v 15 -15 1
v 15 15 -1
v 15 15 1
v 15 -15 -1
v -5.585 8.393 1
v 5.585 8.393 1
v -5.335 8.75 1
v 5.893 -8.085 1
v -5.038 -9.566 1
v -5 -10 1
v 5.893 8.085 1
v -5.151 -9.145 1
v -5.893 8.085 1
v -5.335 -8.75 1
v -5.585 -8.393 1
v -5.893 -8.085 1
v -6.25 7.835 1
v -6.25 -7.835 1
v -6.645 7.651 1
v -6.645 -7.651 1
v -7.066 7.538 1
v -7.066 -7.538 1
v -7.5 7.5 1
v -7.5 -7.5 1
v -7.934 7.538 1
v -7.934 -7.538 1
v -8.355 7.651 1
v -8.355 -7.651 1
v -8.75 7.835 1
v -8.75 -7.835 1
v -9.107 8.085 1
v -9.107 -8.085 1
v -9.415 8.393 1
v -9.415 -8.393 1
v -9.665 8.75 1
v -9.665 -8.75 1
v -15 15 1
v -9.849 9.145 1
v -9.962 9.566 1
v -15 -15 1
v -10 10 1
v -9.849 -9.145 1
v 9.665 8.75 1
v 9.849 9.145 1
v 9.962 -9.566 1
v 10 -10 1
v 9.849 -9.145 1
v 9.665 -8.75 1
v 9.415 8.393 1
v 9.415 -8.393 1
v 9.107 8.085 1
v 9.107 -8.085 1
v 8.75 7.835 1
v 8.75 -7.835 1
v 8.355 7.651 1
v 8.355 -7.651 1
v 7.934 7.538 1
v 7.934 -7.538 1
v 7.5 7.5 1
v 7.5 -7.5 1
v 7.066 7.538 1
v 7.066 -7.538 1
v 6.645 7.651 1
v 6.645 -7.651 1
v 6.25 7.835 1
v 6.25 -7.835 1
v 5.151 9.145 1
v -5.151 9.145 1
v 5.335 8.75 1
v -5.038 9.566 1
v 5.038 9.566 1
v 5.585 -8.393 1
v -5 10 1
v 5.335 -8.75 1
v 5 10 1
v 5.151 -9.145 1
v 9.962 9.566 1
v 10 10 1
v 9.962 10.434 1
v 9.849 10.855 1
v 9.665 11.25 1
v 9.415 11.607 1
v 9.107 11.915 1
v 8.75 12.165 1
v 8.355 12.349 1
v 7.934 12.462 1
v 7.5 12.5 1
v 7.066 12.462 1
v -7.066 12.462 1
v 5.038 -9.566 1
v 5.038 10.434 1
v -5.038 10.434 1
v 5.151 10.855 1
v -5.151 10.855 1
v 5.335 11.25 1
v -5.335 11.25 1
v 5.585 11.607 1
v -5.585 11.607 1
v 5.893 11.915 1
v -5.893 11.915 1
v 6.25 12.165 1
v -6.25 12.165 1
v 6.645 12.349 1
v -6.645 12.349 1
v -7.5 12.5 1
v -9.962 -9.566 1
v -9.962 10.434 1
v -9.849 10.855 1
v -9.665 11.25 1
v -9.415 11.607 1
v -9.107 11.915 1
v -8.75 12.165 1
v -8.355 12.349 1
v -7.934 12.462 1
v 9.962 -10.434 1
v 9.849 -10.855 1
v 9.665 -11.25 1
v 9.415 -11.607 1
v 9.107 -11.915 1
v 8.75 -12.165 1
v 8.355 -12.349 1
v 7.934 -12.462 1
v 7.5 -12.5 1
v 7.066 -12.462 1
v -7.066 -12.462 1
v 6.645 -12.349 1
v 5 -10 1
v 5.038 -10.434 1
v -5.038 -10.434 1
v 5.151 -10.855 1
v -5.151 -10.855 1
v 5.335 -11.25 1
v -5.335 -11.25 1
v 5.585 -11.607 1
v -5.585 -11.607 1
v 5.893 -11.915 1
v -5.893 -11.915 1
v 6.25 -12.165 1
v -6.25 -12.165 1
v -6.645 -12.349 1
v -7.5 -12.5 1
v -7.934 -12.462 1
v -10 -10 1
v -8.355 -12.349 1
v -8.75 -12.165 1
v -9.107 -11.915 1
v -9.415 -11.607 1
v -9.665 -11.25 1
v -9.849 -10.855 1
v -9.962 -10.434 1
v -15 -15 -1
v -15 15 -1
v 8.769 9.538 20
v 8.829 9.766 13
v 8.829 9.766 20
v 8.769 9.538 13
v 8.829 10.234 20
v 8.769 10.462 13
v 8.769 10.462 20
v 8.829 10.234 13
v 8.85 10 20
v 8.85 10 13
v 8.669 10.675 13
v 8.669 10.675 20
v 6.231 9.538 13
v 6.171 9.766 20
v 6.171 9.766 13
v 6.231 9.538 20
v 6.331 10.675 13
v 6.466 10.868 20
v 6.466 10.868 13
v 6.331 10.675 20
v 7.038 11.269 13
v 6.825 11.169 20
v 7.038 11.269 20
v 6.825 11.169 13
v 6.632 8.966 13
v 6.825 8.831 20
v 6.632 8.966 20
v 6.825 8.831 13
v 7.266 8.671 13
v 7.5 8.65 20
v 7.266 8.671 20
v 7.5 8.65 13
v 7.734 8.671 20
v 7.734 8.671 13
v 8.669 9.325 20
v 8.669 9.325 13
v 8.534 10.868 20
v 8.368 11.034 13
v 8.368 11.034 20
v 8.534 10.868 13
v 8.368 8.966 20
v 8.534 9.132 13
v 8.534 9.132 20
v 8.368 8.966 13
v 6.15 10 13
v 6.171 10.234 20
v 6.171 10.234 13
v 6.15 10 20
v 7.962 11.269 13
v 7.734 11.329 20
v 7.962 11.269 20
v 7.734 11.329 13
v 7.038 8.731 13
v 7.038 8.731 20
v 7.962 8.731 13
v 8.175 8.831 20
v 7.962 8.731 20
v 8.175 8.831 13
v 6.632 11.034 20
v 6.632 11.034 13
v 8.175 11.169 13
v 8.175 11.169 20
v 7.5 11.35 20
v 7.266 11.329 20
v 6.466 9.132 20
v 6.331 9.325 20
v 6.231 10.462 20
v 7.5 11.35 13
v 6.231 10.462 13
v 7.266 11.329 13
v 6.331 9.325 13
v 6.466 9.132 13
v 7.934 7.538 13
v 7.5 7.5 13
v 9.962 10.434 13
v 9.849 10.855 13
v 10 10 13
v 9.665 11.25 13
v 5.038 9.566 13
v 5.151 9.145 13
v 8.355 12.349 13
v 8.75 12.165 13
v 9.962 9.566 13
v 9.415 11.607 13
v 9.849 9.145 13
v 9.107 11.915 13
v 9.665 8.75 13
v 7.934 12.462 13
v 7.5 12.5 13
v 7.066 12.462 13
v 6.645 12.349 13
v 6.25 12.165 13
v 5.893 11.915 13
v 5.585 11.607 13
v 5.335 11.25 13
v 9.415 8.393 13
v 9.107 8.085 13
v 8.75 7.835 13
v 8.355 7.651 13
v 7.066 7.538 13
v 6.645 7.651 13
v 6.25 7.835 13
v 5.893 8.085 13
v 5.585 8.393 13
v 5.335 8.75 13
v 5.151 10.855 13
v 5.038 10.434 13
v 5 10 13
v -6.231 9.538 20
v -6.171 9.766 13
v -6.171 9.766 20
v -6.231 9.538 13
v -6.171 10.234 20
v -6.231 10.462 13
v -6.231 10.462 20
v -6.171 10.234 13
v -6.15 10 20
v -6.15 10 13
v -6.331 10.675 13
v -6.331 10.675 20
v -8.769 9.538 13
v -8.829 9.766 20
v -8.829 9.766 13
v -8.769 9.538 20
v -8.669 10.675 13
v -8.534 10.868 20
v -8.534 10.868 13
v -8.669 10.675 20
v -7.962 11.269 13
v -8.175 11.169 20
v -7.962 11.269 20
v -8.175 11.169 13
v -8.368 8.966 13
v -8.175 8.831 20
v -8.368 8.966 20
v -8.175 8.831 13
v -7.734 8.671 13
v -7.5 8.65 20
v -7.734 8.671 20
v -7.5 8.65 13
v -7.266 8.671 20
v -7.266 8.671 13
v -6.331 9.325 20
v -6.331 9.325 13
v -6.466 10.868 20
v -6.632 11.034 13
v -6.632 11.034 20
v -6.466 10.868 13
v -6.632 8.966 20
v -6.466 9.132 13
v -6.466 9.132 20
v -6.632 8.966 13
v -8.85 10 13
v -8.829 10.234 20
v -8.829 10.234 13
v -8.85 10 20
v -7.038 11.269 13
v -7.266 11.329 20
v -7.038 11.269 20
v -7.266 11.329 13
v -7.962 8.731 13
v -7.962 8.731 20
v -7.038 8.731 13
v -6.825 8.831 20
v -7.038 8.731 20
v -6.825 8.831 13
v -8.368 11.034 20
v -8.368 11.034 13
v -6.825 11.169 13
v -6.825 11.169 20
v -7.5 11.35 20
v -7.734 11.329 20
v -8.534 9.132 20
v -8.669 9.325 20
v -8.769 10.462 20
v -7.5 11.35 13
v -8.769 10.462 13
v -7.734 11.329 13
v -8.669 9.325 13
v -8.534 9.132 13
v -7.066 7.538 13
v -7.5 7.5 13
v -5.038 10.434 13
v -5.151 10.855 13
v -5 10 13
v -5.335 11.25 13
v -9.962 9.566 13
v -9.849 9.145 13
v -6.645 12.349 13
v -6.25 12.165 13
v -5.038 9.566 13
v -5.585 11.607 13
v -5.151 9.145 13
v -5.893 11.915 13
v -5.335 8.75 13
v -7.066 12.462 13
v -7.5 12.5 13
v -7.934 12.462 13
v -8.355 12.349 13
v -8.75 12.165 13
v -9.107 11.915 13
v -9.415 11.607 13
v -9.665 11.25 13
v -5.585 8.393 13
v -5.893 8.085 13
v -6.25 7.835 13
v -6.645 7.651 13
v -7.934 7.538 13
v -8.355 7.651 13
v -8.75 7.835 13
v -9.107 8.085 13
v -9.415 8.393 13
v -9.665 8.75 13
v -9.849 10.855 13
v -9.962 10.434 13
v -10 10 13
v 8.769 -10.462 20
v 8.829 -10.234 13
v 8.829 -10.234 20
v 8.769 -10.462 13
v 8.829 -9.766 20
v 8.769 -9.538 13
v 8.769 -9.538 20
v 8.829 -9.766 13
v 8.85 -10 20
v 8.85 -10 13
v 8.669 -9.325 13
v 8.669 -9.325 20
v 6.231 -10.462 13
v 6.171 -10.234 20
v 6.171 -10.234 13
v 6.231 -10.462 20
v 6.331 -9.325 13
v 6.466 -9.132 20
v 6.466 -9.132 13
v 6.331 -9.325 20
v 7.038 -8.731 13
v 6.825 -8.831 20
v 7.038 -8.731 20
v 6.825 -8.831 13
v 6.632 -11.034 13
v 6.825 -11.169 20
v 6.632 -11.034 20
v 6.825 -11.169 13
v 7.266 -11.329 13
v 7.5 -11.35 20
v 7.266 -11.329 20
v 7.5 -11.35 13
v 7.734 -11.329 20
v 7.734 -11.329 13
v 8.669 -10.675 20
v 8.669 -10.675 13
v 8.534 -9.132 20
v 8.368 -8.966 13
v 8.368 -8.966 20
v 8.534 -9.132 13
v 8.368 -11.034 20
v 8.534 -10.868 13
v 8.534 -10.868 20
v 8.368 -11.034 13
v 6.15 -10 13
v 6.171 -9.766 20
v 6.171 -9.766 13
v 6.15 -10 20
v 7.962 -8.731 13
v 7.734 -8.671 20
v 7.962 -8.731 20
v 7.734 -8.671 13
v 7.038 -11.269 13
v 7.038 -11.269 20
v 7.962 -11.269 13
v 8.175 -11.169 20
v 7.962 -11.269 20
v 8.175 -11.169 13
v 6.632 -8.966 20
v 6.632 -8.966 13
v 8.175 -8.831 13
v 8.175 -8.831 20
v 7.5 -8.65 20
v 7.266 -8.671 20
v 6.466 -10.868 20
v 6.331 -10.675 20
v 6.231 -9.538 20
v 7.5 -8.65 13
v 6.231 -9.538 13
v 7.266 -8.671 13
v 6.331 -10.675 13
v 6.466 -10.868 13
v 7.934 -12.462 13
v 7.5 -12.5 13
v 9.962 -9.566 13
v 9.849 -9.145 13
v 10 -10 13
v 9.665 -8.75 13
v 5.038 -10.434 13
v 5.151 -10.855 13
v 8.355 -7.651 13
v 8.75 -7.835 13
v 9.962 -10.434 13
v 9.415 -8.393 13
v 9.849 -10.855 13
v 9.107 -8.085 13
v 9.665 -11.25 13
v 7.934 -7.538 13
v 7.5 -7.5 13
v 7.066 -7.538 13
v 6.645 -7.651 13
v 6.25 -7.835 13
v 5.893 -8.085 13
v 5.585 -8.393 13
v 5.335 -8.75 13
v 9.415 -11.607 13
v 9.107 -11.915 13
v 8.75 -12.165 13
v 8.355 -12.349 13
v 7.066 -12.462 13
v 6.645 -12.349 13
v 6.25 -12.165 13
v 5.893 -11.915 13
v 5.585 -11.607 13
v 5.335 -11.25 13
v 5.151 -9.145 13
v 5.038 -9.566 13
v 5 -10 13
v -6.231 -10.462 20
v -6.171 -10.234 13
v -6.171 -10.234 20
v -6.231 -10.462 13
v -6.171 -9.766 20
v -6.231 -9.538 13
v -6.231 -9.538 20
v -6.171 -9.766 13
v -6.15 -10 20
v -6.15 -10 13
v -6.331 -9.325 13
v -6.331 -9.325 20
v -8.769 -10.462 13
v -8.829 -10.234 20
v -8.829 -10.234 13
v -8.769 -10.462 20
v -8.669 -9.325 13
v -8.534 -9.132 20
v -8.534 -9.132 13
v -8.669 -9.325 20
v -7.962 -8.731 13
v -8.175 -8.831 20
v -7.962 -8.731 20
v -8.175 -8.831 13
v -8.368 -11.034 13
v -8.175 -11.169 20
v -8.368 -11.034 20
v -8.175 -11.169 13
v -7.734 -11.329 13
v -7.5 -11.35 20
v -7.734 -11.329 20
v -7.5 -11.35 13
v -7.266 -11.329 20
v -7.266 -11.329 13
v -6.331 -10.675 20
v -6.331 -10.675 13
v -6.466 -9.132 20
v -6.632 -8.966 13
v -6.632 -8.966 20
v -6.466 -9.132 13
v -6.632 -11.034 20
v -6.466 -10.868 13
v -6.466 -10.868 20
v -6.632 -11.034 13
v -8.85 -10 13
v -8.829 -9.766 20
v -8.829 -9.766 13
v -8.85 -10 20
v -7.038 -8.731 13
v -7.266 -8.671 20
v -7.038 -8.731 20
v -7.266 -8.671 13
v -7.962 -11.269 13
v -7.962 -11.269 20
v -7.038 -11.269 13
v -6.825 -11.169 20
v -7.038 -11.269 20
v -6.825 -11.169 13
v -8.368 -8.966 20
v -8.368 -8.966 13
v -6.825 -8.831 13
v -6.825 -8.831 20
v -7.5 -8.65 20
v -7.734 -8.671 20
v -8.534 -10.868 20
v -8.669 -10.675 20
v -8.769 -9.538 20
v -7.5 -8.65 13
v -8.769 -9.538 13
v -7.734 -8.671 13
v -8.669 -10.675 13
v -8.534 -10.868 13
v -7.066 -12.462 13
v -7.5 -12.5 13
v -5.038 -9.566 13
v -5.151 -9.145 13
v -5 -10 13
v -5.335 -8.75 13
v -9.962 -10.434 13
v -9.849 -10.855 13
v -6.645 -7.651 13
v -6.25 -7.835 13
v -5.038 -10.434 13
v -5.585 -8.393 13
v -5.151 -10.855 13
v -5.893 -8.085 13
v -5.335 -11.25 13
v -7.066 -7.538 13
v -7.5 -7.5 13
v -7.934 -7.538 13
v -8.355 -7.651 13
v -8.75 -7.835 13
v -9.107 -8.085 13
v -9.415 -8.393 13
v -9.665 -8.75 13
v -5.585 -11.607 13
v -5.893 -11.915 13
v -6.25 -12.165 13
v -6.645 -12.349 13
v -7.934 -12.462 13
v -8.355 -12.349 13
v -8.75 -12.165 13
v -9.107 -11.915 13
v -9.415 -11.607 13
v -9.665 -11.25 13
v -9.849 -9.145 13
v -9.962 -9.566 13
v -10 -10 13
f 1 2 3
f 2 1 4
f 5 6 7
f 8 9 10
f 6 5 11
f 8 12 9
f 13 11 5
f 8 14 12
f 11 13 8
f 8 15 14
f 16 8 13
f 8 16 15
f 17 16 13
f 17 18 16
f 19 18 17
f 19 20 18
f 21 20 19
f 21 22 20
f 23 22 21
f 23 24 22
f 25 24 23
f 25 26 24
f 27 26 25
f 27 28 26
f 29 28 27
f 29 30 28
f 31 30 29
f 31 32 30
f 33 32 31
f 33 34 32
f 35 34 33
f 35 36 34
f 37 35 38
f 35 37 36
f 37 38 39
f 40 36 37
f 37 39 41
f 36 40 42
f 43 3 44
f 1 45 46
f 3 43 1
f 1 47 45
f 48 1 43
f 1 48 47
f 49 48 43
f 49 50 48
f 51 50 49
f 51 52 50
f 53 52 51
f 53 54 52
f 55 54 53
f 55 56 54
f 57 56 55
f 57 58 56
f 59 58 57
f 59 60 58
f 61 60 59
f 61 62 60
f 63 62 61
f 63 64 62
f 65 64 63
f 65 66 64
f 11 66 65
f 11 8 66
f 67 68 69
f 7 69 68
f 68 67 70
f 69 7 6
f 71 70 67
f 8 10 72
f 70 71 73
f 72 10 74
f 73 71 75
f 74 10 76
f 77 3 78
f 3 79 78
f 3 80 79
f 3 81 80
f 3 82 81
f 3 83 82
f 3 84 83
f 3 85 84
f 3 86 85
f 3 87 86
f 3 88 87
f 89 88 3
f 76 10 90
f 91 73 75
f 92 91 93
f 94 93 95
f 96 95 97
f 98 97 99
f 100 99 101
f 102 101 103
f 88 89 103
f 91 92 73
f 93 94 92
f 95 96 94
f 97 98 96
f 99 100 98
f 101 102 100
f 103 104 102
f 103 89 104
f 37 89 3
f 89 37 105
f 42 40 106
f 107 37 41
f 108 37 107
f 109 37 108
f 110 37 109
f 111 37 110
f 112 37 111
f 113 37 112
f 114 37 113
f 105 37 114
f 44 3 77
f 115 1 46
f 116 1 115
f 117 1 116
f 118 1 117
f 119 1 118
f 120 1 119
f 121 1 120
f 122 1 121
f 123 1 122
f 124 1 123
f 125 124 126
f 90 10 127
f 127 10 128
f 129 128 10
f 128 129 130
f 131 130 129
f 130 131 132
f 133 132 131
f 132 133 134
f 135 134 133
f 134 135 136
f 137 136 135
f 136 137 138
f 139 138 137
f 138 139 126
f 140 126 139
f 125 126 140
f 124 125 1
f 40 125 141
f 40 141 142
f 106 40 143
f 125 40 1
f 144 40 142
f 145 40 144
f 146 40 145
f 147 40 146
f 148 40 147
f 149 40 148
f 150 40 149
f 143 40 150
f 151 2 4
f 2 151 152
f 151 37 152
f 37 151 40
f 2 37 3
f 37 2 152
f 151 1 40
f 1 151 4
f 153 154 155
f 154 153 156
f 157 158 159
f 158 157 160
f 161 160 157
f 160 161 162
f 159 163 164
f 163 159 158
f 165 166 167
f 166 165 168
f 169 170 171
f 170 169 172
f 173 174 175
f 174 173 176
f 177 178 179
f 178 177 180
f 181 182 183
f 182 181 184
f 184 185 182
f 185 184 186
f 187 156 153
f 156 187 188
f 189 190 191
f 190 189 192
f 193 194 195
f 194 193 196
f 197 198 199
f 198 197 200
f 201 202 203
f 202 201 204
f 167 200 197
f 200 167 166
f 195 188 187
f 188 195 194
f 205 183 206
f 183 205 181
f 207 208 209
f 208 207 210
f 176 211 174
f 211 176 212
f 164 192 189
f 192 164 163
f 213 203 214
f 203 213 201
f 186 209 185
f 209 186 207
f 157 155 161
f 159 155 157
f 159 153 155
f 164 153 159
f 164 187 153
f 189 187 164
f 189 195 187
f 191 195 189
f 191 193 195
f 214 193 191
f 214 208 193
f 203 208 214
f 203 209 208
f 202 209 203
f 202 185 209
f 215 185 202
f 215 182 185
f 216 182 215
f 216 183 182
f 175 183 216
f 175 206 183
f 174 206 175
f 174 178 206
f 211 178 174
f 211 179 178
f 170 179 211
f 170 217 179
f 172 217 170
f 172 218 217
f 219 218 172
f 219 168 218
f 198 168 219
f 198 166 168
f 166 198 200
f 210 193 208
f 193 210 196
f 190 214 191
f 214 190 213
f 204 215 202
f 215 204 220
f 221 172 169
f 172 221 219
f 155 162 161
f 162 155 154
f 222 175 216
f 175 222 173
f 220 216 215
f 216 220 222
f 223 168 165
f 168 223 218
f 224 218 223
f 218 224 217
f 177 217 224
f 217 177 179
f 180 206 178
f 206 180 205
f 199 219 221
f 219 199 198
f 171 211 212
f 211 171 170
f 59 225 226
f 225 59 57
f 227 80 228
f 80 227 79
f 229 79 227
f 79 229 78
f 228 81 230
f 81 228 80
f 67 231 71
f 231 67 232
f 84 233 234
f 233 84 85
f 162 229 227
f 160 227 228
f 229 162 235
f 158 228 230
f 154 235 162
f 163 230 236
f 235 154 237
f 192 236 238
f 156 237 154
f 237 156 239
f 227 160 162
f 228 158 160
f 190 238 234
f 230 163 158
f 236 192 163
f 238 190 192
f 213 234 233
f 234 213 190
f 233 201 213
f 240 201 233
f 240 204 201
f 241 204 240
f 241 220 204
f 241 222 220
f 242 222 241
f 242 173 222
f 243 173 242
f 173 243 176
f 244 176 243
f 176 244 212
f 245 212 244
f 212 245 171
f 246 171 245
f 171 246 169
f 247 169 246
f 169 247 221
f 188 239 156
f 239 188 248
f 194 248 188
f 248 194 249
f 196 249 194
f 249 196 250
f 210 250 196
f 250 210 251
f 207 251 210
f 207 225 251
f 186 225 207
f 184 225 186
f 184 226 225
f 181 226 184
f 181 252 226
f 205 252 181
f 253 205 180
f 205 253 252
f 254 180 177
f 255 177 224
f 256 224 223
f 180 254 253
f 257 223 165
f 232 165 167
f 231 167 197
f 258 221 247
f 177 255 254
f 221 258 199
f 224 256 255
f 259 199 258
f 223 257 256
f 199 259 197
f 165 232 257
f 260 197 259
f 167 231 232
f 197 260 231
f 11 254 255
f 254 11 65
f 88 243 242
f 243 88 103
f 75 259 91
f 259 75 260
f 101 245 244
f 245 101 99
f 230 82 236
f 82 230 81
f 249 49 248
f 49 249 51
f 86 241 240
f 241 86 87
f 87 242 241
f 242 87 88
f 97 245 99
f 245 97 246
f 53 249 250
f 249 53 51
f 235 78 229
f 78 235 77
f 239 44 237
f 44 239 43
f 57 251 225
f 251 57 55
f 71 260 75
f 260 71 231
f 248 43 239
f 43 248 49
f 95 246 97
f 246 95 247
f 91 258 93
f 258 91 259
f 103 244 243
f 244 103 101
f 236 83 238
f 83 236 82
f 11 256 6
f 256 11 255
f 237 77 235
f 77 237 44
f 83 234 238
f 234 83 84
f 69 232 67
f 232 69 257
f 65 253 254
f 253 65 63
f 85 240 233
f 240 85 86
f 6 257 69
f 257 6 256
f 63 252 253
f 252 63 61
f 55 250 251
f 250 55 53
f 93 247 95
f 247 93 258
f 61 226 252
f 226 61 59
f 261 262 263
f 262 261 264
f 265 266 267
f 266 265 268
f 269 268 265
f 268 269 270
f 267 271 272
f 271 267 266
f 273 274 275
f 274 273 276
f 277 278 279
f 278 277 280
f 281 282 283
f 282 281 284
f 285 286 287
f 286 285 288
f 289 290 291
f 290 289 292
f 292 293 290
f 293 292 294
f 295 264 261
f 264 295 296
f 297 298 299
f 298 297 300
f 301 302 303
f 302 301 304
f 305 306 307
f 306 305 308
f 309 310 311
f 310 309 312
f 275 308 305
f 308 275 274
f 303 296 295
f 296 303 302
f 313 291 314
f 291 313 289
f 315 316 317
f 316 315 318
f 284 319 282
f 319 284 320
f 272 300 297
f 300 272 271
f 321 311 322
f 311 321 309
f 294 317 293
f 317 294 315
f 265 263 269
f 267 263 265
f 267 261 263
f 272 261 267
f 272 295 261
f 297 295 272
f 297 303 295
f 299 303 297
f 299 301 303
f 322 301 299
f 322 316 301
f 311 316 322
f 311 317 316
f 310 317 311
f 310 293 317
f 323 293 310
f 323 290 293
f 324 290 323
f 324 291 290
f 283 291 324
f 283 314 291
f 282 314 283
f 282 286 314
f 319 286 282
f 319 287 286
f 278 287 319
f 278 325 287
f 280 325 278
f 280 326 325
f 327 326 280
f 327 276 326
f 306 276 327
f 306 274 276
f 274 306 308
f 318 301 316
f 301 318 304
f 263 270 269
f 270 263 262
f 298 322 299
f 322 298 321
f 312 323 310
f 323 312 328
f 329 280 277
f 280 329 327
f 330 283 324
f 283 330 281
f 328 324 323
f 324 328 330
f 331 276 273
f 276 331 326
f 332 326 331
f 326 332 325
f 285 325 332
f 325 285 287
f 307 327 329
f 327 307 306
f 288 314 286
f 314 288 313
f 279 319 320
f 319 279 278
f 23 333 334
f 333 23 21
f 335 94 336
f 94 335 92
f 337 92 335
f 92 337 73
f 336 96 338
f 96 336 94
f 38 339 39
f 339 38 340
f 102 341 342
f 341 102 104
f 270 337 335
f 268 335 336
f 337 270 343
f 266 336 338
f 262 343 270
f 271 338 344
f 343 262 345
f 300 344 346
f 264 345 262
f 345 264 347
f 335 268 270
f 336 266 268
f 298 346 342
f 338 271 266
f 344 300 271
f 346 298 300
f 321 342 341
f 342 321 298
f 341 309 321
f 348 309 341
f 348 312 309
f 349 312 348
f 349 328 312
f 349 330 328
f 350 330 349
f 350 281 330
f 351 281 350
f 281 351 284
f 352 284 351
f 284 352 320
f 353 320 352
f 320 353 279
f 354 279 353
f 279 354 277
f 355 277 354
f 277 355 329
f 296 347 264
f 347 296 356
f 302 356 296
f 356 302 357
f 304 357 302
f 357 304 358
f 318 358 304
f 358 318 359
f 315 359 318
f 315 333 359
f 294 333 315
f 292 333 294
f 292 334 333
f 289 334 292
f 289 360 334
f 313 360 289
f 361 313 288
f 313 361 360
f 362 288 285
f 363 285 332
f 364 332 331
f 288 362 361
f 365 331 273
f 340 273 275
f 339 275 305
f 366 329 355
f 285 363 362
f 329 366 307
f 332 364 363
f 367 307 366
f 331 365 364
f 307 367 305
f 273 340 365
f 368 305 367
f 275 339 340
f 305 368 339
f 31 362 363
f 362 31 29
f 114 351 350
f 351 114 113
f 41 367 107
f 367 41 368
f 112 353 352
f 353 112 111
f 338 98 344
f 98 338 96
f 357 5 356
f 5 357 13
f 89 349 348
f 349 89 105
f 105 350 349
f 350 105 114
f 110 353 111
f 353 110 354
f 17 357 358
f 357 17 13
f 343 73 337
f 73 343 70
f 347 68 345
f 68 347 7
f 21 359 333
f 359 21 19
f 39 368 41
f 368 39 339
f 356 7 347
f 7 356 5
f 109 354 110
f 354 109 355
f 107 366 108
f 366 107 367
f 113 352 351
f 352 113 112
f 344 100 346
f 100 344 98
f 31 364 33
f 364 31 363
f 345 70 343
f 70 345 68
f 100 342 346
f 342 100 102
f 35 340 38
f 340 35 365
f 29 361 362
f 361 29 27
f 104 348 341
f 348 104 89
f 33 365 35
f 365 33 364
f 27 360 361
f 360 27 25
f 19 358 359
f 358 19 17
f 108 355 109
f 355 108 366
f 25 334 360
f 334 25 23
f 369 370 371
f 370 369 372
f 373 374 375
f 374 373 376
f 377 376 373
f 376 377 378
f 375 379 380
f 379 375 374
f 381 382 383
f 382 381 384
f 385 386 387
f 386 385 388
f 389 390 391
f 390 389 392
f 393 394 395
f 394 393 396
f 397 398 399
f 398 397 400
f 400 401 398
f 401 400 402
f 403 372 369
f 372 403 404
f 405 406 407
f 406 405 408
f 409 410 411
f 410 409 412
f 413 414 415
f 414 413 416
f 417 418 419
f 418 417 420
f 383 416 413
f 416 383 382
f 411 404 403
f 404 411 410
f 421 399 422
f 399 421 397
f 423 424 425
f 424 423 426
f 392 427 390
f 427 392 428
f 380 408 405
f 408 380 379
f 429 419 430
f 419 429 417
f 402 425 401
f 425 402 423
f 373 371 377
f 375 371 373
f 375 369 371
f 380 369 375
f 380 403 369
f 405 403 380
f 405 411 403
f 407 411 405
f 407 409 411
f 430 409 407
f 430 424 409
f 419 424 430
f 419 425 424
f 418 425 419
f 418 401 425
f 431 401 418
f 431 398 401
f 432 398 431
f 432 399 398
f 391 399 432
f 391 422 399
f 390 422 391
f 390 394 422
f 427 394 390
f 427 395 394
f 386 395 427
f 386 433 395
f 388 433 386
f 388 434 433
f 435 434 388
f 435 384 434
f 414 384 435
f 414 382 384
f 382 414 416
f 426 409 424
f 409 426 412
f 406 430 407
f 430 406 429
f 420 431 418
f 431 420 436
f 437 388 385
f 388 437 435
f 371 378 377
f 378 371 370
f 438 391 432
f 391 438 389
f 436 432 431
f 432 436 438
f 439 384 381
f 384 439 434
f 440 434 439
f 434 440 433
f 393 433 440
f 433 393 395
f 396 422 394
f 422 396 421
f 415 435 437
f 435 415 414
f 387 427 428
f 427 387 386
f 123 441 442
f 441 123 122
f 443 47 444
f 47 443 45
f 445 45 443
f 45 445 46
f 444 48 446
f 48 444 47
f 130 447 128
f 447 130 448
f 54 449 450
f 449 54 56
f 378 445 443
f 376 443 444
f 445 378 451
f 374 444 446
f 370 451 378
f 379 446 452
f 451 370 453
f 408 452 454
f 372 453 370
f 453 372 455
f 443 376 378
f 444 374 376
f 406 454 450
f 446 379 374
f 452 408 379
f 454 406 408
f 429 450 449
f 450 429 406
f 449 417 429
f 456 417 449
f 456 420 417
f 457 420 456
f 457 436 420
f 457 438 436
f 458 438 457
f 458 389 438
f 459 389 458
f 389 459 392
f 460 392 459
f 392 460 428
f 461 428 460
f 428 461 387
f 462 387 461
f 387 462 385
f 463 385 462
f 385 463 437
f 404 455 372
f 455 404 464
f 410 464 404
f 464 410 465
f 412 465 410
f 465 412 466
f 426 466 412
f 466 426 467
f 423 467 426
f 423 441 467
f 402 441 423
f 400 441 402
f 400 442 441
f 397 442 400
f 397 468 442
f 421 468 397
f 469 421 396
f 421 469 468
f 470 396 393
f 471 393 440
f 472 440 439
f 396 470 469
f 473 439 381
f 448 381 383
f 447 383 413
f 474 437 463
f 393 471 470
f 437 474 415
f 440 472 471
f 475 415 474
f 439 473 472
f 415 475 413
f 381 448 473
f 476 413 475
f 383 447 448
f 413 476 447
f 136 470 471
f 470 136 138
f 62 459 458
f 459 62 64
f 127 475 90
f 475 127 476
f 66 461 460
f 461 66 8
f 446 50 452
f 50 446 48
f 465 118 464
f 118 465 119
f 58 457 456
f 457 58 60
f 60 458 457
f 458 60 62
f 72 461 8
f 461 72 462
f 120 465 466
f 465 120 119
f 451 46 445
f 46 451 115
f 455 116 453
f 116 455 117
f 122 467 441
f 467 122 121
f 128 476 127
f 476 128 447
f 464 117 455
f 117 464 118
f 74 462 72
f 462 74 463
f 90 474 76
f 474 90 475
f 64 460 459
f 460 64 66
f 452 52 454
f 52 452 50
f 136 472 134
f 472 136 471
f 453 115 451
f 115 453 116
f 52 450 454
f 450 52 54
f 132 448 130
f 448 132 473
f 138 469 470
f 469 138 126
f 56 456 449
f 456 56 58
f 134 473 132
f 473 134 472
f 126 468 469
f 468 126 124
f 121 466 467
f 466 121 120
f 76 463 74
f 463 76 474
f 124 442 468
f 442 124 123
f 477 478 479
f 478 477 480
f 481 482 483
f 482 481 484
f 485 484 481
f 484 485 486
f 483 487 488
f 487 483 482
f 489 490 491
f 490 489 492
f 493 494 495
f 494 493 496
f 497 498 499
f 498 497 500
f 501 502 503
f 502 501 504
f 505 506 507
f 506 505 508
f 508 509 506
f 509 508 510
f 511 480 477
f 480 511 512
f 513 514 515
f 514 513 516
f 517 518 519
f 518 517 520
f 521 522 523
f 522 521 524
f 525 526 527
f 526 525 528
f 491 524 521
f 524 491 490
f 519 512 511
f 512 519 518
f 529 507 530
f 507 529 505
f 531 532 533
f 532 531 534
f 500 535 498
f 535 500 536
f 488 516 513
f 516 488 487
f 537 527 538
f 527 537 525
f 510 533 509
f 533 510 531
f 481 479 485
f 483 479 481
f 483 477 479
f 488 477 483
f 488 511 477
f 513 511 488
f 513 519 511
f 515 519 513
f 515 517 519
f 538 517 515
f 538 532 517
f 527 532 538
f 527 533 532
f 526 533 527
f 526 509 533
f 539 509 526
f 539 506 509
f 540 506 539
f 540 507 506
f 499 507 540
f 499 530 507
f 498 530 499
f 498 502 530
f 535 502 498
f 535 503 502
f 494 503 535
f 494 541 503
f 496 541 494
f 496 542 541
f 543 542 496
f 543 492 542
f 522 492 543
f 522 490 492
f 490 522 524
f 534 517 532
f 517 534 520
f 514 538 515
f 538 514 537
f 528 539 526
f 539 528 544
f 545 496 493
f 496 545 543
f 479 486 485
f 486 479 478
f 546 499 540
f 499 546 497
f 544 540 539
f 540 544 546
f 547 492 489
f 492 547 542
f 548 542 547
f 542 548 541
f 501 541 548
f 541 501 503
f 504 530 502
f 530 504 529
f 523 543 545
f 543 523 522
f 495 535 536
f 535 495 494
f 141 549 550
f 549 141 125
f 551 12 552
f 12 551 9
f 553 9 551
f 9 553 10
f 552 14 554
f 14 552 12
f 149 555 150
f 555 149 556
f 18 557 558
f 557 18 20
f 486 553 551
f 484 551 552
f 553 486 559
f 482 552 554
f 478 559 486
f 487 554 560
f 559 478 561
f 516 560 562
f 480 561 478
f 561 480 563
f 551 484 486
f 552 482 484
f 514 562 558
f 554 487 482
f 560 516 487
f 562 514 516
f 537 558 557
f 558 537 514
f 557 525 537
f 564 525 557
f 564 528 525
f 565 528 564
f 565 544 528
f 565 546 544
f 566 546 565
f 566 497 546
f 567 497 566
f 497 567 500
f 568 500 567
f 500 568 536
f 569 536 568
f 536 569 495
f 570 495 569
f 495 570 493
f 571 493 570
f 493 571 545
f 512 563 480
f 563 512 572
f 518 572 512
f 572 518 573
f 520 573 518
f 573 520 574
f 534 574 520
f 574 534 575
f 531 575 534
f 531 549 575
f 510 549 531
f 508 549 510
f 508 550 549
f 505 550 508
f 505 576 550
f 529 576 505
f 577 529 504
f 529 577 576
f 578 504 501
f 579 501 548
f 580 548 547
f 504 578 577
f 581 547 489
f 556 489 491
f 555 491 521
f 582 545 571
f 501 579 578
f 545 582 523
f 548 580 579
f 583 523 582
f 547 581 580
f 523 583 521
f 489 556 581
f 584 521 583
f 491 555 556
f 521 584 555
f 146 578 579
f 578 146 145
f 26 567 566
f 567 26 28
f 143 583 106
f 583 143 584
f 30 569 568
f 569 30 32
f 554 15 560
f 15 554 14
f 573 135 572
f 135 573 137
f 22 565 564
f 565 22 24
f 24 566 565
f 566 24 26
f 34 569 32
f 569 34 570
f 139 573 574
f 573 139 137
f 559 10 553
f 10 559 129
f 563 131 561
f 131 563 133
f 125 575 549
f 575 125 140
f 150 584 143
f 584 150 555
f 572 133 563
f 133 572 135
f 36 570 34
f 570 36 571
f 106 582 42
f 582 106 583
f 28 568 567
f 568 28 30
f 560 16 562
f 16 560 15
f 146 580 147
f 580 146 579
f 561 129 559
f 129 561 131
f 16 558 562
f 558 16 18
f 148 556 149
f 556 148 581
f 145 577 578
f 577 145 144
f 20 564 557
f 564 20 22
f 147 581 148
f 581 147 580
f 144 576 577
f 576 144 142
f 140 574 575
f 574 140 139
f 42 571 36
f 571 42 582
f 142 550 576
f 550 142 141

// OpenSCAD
//---------------------------------------------------------------------------------------------
//-- Print of OpenBeam
//-- (c) Martin Korinek	m.ko@inode.at
//-- April-2015
//---------------------------------------------------------------------------------------------
//--
//---------------------------------------------------------------------------------------------

use <MCAD/fonts.scad>

//fragment minimum angle
  $fa=10.0;

//fragment minimum size
  $fs=0.2;
  
  SmallPinHight = 20.0;
  BigPinHeight = 13.0;
  SmallPinsDiameter = 2.7;
  BigPinsDiameter = 5.0;   

difference()
{
	//cube([70,90,1],center = true);
	cube([30,30,2],center = true);
	translate([0,0,-2])
	{
		translate([28,38,0])
			cylinder(d = 7, h = 5);
		translate([-28,38,0])
			cylinder(d = 7, h = 5);
		translate([28,-38,0])
			cylinder(d = 7, h = 5);
		translate([-28,-38,0])
			cylinder(d = 7, h = 5);
	}
	
}

translate([7.5,10,0])
{       
	cylinder(d = SmallPinsDiameter, h = SmallPinHight);
    cylinder(d = BigPinsDiameter, h = BigPinHeight);
};
translate([-7.5,10,0])
{
   	cylinder(d = SmallPinsDiameter, h = SmallPinHight);
    cylinder(d = BigPinsDiameter, h = BigPinHeight); 
}

translate([7.5,-10,0])
{
   	cylinder(d = SmallPinsDiameter, h = SmallPinHight);
    cylinder(d = BigPinsDiameter, h = BigPinHeight); 
}
		
translate([-7.5,-10,0])
{
   	cylinder(d = SmallPinsDiameter, h = SmallPinHight);
    cylinder(d = BigPinsDiameter, h = BigPinHeight); 
}
